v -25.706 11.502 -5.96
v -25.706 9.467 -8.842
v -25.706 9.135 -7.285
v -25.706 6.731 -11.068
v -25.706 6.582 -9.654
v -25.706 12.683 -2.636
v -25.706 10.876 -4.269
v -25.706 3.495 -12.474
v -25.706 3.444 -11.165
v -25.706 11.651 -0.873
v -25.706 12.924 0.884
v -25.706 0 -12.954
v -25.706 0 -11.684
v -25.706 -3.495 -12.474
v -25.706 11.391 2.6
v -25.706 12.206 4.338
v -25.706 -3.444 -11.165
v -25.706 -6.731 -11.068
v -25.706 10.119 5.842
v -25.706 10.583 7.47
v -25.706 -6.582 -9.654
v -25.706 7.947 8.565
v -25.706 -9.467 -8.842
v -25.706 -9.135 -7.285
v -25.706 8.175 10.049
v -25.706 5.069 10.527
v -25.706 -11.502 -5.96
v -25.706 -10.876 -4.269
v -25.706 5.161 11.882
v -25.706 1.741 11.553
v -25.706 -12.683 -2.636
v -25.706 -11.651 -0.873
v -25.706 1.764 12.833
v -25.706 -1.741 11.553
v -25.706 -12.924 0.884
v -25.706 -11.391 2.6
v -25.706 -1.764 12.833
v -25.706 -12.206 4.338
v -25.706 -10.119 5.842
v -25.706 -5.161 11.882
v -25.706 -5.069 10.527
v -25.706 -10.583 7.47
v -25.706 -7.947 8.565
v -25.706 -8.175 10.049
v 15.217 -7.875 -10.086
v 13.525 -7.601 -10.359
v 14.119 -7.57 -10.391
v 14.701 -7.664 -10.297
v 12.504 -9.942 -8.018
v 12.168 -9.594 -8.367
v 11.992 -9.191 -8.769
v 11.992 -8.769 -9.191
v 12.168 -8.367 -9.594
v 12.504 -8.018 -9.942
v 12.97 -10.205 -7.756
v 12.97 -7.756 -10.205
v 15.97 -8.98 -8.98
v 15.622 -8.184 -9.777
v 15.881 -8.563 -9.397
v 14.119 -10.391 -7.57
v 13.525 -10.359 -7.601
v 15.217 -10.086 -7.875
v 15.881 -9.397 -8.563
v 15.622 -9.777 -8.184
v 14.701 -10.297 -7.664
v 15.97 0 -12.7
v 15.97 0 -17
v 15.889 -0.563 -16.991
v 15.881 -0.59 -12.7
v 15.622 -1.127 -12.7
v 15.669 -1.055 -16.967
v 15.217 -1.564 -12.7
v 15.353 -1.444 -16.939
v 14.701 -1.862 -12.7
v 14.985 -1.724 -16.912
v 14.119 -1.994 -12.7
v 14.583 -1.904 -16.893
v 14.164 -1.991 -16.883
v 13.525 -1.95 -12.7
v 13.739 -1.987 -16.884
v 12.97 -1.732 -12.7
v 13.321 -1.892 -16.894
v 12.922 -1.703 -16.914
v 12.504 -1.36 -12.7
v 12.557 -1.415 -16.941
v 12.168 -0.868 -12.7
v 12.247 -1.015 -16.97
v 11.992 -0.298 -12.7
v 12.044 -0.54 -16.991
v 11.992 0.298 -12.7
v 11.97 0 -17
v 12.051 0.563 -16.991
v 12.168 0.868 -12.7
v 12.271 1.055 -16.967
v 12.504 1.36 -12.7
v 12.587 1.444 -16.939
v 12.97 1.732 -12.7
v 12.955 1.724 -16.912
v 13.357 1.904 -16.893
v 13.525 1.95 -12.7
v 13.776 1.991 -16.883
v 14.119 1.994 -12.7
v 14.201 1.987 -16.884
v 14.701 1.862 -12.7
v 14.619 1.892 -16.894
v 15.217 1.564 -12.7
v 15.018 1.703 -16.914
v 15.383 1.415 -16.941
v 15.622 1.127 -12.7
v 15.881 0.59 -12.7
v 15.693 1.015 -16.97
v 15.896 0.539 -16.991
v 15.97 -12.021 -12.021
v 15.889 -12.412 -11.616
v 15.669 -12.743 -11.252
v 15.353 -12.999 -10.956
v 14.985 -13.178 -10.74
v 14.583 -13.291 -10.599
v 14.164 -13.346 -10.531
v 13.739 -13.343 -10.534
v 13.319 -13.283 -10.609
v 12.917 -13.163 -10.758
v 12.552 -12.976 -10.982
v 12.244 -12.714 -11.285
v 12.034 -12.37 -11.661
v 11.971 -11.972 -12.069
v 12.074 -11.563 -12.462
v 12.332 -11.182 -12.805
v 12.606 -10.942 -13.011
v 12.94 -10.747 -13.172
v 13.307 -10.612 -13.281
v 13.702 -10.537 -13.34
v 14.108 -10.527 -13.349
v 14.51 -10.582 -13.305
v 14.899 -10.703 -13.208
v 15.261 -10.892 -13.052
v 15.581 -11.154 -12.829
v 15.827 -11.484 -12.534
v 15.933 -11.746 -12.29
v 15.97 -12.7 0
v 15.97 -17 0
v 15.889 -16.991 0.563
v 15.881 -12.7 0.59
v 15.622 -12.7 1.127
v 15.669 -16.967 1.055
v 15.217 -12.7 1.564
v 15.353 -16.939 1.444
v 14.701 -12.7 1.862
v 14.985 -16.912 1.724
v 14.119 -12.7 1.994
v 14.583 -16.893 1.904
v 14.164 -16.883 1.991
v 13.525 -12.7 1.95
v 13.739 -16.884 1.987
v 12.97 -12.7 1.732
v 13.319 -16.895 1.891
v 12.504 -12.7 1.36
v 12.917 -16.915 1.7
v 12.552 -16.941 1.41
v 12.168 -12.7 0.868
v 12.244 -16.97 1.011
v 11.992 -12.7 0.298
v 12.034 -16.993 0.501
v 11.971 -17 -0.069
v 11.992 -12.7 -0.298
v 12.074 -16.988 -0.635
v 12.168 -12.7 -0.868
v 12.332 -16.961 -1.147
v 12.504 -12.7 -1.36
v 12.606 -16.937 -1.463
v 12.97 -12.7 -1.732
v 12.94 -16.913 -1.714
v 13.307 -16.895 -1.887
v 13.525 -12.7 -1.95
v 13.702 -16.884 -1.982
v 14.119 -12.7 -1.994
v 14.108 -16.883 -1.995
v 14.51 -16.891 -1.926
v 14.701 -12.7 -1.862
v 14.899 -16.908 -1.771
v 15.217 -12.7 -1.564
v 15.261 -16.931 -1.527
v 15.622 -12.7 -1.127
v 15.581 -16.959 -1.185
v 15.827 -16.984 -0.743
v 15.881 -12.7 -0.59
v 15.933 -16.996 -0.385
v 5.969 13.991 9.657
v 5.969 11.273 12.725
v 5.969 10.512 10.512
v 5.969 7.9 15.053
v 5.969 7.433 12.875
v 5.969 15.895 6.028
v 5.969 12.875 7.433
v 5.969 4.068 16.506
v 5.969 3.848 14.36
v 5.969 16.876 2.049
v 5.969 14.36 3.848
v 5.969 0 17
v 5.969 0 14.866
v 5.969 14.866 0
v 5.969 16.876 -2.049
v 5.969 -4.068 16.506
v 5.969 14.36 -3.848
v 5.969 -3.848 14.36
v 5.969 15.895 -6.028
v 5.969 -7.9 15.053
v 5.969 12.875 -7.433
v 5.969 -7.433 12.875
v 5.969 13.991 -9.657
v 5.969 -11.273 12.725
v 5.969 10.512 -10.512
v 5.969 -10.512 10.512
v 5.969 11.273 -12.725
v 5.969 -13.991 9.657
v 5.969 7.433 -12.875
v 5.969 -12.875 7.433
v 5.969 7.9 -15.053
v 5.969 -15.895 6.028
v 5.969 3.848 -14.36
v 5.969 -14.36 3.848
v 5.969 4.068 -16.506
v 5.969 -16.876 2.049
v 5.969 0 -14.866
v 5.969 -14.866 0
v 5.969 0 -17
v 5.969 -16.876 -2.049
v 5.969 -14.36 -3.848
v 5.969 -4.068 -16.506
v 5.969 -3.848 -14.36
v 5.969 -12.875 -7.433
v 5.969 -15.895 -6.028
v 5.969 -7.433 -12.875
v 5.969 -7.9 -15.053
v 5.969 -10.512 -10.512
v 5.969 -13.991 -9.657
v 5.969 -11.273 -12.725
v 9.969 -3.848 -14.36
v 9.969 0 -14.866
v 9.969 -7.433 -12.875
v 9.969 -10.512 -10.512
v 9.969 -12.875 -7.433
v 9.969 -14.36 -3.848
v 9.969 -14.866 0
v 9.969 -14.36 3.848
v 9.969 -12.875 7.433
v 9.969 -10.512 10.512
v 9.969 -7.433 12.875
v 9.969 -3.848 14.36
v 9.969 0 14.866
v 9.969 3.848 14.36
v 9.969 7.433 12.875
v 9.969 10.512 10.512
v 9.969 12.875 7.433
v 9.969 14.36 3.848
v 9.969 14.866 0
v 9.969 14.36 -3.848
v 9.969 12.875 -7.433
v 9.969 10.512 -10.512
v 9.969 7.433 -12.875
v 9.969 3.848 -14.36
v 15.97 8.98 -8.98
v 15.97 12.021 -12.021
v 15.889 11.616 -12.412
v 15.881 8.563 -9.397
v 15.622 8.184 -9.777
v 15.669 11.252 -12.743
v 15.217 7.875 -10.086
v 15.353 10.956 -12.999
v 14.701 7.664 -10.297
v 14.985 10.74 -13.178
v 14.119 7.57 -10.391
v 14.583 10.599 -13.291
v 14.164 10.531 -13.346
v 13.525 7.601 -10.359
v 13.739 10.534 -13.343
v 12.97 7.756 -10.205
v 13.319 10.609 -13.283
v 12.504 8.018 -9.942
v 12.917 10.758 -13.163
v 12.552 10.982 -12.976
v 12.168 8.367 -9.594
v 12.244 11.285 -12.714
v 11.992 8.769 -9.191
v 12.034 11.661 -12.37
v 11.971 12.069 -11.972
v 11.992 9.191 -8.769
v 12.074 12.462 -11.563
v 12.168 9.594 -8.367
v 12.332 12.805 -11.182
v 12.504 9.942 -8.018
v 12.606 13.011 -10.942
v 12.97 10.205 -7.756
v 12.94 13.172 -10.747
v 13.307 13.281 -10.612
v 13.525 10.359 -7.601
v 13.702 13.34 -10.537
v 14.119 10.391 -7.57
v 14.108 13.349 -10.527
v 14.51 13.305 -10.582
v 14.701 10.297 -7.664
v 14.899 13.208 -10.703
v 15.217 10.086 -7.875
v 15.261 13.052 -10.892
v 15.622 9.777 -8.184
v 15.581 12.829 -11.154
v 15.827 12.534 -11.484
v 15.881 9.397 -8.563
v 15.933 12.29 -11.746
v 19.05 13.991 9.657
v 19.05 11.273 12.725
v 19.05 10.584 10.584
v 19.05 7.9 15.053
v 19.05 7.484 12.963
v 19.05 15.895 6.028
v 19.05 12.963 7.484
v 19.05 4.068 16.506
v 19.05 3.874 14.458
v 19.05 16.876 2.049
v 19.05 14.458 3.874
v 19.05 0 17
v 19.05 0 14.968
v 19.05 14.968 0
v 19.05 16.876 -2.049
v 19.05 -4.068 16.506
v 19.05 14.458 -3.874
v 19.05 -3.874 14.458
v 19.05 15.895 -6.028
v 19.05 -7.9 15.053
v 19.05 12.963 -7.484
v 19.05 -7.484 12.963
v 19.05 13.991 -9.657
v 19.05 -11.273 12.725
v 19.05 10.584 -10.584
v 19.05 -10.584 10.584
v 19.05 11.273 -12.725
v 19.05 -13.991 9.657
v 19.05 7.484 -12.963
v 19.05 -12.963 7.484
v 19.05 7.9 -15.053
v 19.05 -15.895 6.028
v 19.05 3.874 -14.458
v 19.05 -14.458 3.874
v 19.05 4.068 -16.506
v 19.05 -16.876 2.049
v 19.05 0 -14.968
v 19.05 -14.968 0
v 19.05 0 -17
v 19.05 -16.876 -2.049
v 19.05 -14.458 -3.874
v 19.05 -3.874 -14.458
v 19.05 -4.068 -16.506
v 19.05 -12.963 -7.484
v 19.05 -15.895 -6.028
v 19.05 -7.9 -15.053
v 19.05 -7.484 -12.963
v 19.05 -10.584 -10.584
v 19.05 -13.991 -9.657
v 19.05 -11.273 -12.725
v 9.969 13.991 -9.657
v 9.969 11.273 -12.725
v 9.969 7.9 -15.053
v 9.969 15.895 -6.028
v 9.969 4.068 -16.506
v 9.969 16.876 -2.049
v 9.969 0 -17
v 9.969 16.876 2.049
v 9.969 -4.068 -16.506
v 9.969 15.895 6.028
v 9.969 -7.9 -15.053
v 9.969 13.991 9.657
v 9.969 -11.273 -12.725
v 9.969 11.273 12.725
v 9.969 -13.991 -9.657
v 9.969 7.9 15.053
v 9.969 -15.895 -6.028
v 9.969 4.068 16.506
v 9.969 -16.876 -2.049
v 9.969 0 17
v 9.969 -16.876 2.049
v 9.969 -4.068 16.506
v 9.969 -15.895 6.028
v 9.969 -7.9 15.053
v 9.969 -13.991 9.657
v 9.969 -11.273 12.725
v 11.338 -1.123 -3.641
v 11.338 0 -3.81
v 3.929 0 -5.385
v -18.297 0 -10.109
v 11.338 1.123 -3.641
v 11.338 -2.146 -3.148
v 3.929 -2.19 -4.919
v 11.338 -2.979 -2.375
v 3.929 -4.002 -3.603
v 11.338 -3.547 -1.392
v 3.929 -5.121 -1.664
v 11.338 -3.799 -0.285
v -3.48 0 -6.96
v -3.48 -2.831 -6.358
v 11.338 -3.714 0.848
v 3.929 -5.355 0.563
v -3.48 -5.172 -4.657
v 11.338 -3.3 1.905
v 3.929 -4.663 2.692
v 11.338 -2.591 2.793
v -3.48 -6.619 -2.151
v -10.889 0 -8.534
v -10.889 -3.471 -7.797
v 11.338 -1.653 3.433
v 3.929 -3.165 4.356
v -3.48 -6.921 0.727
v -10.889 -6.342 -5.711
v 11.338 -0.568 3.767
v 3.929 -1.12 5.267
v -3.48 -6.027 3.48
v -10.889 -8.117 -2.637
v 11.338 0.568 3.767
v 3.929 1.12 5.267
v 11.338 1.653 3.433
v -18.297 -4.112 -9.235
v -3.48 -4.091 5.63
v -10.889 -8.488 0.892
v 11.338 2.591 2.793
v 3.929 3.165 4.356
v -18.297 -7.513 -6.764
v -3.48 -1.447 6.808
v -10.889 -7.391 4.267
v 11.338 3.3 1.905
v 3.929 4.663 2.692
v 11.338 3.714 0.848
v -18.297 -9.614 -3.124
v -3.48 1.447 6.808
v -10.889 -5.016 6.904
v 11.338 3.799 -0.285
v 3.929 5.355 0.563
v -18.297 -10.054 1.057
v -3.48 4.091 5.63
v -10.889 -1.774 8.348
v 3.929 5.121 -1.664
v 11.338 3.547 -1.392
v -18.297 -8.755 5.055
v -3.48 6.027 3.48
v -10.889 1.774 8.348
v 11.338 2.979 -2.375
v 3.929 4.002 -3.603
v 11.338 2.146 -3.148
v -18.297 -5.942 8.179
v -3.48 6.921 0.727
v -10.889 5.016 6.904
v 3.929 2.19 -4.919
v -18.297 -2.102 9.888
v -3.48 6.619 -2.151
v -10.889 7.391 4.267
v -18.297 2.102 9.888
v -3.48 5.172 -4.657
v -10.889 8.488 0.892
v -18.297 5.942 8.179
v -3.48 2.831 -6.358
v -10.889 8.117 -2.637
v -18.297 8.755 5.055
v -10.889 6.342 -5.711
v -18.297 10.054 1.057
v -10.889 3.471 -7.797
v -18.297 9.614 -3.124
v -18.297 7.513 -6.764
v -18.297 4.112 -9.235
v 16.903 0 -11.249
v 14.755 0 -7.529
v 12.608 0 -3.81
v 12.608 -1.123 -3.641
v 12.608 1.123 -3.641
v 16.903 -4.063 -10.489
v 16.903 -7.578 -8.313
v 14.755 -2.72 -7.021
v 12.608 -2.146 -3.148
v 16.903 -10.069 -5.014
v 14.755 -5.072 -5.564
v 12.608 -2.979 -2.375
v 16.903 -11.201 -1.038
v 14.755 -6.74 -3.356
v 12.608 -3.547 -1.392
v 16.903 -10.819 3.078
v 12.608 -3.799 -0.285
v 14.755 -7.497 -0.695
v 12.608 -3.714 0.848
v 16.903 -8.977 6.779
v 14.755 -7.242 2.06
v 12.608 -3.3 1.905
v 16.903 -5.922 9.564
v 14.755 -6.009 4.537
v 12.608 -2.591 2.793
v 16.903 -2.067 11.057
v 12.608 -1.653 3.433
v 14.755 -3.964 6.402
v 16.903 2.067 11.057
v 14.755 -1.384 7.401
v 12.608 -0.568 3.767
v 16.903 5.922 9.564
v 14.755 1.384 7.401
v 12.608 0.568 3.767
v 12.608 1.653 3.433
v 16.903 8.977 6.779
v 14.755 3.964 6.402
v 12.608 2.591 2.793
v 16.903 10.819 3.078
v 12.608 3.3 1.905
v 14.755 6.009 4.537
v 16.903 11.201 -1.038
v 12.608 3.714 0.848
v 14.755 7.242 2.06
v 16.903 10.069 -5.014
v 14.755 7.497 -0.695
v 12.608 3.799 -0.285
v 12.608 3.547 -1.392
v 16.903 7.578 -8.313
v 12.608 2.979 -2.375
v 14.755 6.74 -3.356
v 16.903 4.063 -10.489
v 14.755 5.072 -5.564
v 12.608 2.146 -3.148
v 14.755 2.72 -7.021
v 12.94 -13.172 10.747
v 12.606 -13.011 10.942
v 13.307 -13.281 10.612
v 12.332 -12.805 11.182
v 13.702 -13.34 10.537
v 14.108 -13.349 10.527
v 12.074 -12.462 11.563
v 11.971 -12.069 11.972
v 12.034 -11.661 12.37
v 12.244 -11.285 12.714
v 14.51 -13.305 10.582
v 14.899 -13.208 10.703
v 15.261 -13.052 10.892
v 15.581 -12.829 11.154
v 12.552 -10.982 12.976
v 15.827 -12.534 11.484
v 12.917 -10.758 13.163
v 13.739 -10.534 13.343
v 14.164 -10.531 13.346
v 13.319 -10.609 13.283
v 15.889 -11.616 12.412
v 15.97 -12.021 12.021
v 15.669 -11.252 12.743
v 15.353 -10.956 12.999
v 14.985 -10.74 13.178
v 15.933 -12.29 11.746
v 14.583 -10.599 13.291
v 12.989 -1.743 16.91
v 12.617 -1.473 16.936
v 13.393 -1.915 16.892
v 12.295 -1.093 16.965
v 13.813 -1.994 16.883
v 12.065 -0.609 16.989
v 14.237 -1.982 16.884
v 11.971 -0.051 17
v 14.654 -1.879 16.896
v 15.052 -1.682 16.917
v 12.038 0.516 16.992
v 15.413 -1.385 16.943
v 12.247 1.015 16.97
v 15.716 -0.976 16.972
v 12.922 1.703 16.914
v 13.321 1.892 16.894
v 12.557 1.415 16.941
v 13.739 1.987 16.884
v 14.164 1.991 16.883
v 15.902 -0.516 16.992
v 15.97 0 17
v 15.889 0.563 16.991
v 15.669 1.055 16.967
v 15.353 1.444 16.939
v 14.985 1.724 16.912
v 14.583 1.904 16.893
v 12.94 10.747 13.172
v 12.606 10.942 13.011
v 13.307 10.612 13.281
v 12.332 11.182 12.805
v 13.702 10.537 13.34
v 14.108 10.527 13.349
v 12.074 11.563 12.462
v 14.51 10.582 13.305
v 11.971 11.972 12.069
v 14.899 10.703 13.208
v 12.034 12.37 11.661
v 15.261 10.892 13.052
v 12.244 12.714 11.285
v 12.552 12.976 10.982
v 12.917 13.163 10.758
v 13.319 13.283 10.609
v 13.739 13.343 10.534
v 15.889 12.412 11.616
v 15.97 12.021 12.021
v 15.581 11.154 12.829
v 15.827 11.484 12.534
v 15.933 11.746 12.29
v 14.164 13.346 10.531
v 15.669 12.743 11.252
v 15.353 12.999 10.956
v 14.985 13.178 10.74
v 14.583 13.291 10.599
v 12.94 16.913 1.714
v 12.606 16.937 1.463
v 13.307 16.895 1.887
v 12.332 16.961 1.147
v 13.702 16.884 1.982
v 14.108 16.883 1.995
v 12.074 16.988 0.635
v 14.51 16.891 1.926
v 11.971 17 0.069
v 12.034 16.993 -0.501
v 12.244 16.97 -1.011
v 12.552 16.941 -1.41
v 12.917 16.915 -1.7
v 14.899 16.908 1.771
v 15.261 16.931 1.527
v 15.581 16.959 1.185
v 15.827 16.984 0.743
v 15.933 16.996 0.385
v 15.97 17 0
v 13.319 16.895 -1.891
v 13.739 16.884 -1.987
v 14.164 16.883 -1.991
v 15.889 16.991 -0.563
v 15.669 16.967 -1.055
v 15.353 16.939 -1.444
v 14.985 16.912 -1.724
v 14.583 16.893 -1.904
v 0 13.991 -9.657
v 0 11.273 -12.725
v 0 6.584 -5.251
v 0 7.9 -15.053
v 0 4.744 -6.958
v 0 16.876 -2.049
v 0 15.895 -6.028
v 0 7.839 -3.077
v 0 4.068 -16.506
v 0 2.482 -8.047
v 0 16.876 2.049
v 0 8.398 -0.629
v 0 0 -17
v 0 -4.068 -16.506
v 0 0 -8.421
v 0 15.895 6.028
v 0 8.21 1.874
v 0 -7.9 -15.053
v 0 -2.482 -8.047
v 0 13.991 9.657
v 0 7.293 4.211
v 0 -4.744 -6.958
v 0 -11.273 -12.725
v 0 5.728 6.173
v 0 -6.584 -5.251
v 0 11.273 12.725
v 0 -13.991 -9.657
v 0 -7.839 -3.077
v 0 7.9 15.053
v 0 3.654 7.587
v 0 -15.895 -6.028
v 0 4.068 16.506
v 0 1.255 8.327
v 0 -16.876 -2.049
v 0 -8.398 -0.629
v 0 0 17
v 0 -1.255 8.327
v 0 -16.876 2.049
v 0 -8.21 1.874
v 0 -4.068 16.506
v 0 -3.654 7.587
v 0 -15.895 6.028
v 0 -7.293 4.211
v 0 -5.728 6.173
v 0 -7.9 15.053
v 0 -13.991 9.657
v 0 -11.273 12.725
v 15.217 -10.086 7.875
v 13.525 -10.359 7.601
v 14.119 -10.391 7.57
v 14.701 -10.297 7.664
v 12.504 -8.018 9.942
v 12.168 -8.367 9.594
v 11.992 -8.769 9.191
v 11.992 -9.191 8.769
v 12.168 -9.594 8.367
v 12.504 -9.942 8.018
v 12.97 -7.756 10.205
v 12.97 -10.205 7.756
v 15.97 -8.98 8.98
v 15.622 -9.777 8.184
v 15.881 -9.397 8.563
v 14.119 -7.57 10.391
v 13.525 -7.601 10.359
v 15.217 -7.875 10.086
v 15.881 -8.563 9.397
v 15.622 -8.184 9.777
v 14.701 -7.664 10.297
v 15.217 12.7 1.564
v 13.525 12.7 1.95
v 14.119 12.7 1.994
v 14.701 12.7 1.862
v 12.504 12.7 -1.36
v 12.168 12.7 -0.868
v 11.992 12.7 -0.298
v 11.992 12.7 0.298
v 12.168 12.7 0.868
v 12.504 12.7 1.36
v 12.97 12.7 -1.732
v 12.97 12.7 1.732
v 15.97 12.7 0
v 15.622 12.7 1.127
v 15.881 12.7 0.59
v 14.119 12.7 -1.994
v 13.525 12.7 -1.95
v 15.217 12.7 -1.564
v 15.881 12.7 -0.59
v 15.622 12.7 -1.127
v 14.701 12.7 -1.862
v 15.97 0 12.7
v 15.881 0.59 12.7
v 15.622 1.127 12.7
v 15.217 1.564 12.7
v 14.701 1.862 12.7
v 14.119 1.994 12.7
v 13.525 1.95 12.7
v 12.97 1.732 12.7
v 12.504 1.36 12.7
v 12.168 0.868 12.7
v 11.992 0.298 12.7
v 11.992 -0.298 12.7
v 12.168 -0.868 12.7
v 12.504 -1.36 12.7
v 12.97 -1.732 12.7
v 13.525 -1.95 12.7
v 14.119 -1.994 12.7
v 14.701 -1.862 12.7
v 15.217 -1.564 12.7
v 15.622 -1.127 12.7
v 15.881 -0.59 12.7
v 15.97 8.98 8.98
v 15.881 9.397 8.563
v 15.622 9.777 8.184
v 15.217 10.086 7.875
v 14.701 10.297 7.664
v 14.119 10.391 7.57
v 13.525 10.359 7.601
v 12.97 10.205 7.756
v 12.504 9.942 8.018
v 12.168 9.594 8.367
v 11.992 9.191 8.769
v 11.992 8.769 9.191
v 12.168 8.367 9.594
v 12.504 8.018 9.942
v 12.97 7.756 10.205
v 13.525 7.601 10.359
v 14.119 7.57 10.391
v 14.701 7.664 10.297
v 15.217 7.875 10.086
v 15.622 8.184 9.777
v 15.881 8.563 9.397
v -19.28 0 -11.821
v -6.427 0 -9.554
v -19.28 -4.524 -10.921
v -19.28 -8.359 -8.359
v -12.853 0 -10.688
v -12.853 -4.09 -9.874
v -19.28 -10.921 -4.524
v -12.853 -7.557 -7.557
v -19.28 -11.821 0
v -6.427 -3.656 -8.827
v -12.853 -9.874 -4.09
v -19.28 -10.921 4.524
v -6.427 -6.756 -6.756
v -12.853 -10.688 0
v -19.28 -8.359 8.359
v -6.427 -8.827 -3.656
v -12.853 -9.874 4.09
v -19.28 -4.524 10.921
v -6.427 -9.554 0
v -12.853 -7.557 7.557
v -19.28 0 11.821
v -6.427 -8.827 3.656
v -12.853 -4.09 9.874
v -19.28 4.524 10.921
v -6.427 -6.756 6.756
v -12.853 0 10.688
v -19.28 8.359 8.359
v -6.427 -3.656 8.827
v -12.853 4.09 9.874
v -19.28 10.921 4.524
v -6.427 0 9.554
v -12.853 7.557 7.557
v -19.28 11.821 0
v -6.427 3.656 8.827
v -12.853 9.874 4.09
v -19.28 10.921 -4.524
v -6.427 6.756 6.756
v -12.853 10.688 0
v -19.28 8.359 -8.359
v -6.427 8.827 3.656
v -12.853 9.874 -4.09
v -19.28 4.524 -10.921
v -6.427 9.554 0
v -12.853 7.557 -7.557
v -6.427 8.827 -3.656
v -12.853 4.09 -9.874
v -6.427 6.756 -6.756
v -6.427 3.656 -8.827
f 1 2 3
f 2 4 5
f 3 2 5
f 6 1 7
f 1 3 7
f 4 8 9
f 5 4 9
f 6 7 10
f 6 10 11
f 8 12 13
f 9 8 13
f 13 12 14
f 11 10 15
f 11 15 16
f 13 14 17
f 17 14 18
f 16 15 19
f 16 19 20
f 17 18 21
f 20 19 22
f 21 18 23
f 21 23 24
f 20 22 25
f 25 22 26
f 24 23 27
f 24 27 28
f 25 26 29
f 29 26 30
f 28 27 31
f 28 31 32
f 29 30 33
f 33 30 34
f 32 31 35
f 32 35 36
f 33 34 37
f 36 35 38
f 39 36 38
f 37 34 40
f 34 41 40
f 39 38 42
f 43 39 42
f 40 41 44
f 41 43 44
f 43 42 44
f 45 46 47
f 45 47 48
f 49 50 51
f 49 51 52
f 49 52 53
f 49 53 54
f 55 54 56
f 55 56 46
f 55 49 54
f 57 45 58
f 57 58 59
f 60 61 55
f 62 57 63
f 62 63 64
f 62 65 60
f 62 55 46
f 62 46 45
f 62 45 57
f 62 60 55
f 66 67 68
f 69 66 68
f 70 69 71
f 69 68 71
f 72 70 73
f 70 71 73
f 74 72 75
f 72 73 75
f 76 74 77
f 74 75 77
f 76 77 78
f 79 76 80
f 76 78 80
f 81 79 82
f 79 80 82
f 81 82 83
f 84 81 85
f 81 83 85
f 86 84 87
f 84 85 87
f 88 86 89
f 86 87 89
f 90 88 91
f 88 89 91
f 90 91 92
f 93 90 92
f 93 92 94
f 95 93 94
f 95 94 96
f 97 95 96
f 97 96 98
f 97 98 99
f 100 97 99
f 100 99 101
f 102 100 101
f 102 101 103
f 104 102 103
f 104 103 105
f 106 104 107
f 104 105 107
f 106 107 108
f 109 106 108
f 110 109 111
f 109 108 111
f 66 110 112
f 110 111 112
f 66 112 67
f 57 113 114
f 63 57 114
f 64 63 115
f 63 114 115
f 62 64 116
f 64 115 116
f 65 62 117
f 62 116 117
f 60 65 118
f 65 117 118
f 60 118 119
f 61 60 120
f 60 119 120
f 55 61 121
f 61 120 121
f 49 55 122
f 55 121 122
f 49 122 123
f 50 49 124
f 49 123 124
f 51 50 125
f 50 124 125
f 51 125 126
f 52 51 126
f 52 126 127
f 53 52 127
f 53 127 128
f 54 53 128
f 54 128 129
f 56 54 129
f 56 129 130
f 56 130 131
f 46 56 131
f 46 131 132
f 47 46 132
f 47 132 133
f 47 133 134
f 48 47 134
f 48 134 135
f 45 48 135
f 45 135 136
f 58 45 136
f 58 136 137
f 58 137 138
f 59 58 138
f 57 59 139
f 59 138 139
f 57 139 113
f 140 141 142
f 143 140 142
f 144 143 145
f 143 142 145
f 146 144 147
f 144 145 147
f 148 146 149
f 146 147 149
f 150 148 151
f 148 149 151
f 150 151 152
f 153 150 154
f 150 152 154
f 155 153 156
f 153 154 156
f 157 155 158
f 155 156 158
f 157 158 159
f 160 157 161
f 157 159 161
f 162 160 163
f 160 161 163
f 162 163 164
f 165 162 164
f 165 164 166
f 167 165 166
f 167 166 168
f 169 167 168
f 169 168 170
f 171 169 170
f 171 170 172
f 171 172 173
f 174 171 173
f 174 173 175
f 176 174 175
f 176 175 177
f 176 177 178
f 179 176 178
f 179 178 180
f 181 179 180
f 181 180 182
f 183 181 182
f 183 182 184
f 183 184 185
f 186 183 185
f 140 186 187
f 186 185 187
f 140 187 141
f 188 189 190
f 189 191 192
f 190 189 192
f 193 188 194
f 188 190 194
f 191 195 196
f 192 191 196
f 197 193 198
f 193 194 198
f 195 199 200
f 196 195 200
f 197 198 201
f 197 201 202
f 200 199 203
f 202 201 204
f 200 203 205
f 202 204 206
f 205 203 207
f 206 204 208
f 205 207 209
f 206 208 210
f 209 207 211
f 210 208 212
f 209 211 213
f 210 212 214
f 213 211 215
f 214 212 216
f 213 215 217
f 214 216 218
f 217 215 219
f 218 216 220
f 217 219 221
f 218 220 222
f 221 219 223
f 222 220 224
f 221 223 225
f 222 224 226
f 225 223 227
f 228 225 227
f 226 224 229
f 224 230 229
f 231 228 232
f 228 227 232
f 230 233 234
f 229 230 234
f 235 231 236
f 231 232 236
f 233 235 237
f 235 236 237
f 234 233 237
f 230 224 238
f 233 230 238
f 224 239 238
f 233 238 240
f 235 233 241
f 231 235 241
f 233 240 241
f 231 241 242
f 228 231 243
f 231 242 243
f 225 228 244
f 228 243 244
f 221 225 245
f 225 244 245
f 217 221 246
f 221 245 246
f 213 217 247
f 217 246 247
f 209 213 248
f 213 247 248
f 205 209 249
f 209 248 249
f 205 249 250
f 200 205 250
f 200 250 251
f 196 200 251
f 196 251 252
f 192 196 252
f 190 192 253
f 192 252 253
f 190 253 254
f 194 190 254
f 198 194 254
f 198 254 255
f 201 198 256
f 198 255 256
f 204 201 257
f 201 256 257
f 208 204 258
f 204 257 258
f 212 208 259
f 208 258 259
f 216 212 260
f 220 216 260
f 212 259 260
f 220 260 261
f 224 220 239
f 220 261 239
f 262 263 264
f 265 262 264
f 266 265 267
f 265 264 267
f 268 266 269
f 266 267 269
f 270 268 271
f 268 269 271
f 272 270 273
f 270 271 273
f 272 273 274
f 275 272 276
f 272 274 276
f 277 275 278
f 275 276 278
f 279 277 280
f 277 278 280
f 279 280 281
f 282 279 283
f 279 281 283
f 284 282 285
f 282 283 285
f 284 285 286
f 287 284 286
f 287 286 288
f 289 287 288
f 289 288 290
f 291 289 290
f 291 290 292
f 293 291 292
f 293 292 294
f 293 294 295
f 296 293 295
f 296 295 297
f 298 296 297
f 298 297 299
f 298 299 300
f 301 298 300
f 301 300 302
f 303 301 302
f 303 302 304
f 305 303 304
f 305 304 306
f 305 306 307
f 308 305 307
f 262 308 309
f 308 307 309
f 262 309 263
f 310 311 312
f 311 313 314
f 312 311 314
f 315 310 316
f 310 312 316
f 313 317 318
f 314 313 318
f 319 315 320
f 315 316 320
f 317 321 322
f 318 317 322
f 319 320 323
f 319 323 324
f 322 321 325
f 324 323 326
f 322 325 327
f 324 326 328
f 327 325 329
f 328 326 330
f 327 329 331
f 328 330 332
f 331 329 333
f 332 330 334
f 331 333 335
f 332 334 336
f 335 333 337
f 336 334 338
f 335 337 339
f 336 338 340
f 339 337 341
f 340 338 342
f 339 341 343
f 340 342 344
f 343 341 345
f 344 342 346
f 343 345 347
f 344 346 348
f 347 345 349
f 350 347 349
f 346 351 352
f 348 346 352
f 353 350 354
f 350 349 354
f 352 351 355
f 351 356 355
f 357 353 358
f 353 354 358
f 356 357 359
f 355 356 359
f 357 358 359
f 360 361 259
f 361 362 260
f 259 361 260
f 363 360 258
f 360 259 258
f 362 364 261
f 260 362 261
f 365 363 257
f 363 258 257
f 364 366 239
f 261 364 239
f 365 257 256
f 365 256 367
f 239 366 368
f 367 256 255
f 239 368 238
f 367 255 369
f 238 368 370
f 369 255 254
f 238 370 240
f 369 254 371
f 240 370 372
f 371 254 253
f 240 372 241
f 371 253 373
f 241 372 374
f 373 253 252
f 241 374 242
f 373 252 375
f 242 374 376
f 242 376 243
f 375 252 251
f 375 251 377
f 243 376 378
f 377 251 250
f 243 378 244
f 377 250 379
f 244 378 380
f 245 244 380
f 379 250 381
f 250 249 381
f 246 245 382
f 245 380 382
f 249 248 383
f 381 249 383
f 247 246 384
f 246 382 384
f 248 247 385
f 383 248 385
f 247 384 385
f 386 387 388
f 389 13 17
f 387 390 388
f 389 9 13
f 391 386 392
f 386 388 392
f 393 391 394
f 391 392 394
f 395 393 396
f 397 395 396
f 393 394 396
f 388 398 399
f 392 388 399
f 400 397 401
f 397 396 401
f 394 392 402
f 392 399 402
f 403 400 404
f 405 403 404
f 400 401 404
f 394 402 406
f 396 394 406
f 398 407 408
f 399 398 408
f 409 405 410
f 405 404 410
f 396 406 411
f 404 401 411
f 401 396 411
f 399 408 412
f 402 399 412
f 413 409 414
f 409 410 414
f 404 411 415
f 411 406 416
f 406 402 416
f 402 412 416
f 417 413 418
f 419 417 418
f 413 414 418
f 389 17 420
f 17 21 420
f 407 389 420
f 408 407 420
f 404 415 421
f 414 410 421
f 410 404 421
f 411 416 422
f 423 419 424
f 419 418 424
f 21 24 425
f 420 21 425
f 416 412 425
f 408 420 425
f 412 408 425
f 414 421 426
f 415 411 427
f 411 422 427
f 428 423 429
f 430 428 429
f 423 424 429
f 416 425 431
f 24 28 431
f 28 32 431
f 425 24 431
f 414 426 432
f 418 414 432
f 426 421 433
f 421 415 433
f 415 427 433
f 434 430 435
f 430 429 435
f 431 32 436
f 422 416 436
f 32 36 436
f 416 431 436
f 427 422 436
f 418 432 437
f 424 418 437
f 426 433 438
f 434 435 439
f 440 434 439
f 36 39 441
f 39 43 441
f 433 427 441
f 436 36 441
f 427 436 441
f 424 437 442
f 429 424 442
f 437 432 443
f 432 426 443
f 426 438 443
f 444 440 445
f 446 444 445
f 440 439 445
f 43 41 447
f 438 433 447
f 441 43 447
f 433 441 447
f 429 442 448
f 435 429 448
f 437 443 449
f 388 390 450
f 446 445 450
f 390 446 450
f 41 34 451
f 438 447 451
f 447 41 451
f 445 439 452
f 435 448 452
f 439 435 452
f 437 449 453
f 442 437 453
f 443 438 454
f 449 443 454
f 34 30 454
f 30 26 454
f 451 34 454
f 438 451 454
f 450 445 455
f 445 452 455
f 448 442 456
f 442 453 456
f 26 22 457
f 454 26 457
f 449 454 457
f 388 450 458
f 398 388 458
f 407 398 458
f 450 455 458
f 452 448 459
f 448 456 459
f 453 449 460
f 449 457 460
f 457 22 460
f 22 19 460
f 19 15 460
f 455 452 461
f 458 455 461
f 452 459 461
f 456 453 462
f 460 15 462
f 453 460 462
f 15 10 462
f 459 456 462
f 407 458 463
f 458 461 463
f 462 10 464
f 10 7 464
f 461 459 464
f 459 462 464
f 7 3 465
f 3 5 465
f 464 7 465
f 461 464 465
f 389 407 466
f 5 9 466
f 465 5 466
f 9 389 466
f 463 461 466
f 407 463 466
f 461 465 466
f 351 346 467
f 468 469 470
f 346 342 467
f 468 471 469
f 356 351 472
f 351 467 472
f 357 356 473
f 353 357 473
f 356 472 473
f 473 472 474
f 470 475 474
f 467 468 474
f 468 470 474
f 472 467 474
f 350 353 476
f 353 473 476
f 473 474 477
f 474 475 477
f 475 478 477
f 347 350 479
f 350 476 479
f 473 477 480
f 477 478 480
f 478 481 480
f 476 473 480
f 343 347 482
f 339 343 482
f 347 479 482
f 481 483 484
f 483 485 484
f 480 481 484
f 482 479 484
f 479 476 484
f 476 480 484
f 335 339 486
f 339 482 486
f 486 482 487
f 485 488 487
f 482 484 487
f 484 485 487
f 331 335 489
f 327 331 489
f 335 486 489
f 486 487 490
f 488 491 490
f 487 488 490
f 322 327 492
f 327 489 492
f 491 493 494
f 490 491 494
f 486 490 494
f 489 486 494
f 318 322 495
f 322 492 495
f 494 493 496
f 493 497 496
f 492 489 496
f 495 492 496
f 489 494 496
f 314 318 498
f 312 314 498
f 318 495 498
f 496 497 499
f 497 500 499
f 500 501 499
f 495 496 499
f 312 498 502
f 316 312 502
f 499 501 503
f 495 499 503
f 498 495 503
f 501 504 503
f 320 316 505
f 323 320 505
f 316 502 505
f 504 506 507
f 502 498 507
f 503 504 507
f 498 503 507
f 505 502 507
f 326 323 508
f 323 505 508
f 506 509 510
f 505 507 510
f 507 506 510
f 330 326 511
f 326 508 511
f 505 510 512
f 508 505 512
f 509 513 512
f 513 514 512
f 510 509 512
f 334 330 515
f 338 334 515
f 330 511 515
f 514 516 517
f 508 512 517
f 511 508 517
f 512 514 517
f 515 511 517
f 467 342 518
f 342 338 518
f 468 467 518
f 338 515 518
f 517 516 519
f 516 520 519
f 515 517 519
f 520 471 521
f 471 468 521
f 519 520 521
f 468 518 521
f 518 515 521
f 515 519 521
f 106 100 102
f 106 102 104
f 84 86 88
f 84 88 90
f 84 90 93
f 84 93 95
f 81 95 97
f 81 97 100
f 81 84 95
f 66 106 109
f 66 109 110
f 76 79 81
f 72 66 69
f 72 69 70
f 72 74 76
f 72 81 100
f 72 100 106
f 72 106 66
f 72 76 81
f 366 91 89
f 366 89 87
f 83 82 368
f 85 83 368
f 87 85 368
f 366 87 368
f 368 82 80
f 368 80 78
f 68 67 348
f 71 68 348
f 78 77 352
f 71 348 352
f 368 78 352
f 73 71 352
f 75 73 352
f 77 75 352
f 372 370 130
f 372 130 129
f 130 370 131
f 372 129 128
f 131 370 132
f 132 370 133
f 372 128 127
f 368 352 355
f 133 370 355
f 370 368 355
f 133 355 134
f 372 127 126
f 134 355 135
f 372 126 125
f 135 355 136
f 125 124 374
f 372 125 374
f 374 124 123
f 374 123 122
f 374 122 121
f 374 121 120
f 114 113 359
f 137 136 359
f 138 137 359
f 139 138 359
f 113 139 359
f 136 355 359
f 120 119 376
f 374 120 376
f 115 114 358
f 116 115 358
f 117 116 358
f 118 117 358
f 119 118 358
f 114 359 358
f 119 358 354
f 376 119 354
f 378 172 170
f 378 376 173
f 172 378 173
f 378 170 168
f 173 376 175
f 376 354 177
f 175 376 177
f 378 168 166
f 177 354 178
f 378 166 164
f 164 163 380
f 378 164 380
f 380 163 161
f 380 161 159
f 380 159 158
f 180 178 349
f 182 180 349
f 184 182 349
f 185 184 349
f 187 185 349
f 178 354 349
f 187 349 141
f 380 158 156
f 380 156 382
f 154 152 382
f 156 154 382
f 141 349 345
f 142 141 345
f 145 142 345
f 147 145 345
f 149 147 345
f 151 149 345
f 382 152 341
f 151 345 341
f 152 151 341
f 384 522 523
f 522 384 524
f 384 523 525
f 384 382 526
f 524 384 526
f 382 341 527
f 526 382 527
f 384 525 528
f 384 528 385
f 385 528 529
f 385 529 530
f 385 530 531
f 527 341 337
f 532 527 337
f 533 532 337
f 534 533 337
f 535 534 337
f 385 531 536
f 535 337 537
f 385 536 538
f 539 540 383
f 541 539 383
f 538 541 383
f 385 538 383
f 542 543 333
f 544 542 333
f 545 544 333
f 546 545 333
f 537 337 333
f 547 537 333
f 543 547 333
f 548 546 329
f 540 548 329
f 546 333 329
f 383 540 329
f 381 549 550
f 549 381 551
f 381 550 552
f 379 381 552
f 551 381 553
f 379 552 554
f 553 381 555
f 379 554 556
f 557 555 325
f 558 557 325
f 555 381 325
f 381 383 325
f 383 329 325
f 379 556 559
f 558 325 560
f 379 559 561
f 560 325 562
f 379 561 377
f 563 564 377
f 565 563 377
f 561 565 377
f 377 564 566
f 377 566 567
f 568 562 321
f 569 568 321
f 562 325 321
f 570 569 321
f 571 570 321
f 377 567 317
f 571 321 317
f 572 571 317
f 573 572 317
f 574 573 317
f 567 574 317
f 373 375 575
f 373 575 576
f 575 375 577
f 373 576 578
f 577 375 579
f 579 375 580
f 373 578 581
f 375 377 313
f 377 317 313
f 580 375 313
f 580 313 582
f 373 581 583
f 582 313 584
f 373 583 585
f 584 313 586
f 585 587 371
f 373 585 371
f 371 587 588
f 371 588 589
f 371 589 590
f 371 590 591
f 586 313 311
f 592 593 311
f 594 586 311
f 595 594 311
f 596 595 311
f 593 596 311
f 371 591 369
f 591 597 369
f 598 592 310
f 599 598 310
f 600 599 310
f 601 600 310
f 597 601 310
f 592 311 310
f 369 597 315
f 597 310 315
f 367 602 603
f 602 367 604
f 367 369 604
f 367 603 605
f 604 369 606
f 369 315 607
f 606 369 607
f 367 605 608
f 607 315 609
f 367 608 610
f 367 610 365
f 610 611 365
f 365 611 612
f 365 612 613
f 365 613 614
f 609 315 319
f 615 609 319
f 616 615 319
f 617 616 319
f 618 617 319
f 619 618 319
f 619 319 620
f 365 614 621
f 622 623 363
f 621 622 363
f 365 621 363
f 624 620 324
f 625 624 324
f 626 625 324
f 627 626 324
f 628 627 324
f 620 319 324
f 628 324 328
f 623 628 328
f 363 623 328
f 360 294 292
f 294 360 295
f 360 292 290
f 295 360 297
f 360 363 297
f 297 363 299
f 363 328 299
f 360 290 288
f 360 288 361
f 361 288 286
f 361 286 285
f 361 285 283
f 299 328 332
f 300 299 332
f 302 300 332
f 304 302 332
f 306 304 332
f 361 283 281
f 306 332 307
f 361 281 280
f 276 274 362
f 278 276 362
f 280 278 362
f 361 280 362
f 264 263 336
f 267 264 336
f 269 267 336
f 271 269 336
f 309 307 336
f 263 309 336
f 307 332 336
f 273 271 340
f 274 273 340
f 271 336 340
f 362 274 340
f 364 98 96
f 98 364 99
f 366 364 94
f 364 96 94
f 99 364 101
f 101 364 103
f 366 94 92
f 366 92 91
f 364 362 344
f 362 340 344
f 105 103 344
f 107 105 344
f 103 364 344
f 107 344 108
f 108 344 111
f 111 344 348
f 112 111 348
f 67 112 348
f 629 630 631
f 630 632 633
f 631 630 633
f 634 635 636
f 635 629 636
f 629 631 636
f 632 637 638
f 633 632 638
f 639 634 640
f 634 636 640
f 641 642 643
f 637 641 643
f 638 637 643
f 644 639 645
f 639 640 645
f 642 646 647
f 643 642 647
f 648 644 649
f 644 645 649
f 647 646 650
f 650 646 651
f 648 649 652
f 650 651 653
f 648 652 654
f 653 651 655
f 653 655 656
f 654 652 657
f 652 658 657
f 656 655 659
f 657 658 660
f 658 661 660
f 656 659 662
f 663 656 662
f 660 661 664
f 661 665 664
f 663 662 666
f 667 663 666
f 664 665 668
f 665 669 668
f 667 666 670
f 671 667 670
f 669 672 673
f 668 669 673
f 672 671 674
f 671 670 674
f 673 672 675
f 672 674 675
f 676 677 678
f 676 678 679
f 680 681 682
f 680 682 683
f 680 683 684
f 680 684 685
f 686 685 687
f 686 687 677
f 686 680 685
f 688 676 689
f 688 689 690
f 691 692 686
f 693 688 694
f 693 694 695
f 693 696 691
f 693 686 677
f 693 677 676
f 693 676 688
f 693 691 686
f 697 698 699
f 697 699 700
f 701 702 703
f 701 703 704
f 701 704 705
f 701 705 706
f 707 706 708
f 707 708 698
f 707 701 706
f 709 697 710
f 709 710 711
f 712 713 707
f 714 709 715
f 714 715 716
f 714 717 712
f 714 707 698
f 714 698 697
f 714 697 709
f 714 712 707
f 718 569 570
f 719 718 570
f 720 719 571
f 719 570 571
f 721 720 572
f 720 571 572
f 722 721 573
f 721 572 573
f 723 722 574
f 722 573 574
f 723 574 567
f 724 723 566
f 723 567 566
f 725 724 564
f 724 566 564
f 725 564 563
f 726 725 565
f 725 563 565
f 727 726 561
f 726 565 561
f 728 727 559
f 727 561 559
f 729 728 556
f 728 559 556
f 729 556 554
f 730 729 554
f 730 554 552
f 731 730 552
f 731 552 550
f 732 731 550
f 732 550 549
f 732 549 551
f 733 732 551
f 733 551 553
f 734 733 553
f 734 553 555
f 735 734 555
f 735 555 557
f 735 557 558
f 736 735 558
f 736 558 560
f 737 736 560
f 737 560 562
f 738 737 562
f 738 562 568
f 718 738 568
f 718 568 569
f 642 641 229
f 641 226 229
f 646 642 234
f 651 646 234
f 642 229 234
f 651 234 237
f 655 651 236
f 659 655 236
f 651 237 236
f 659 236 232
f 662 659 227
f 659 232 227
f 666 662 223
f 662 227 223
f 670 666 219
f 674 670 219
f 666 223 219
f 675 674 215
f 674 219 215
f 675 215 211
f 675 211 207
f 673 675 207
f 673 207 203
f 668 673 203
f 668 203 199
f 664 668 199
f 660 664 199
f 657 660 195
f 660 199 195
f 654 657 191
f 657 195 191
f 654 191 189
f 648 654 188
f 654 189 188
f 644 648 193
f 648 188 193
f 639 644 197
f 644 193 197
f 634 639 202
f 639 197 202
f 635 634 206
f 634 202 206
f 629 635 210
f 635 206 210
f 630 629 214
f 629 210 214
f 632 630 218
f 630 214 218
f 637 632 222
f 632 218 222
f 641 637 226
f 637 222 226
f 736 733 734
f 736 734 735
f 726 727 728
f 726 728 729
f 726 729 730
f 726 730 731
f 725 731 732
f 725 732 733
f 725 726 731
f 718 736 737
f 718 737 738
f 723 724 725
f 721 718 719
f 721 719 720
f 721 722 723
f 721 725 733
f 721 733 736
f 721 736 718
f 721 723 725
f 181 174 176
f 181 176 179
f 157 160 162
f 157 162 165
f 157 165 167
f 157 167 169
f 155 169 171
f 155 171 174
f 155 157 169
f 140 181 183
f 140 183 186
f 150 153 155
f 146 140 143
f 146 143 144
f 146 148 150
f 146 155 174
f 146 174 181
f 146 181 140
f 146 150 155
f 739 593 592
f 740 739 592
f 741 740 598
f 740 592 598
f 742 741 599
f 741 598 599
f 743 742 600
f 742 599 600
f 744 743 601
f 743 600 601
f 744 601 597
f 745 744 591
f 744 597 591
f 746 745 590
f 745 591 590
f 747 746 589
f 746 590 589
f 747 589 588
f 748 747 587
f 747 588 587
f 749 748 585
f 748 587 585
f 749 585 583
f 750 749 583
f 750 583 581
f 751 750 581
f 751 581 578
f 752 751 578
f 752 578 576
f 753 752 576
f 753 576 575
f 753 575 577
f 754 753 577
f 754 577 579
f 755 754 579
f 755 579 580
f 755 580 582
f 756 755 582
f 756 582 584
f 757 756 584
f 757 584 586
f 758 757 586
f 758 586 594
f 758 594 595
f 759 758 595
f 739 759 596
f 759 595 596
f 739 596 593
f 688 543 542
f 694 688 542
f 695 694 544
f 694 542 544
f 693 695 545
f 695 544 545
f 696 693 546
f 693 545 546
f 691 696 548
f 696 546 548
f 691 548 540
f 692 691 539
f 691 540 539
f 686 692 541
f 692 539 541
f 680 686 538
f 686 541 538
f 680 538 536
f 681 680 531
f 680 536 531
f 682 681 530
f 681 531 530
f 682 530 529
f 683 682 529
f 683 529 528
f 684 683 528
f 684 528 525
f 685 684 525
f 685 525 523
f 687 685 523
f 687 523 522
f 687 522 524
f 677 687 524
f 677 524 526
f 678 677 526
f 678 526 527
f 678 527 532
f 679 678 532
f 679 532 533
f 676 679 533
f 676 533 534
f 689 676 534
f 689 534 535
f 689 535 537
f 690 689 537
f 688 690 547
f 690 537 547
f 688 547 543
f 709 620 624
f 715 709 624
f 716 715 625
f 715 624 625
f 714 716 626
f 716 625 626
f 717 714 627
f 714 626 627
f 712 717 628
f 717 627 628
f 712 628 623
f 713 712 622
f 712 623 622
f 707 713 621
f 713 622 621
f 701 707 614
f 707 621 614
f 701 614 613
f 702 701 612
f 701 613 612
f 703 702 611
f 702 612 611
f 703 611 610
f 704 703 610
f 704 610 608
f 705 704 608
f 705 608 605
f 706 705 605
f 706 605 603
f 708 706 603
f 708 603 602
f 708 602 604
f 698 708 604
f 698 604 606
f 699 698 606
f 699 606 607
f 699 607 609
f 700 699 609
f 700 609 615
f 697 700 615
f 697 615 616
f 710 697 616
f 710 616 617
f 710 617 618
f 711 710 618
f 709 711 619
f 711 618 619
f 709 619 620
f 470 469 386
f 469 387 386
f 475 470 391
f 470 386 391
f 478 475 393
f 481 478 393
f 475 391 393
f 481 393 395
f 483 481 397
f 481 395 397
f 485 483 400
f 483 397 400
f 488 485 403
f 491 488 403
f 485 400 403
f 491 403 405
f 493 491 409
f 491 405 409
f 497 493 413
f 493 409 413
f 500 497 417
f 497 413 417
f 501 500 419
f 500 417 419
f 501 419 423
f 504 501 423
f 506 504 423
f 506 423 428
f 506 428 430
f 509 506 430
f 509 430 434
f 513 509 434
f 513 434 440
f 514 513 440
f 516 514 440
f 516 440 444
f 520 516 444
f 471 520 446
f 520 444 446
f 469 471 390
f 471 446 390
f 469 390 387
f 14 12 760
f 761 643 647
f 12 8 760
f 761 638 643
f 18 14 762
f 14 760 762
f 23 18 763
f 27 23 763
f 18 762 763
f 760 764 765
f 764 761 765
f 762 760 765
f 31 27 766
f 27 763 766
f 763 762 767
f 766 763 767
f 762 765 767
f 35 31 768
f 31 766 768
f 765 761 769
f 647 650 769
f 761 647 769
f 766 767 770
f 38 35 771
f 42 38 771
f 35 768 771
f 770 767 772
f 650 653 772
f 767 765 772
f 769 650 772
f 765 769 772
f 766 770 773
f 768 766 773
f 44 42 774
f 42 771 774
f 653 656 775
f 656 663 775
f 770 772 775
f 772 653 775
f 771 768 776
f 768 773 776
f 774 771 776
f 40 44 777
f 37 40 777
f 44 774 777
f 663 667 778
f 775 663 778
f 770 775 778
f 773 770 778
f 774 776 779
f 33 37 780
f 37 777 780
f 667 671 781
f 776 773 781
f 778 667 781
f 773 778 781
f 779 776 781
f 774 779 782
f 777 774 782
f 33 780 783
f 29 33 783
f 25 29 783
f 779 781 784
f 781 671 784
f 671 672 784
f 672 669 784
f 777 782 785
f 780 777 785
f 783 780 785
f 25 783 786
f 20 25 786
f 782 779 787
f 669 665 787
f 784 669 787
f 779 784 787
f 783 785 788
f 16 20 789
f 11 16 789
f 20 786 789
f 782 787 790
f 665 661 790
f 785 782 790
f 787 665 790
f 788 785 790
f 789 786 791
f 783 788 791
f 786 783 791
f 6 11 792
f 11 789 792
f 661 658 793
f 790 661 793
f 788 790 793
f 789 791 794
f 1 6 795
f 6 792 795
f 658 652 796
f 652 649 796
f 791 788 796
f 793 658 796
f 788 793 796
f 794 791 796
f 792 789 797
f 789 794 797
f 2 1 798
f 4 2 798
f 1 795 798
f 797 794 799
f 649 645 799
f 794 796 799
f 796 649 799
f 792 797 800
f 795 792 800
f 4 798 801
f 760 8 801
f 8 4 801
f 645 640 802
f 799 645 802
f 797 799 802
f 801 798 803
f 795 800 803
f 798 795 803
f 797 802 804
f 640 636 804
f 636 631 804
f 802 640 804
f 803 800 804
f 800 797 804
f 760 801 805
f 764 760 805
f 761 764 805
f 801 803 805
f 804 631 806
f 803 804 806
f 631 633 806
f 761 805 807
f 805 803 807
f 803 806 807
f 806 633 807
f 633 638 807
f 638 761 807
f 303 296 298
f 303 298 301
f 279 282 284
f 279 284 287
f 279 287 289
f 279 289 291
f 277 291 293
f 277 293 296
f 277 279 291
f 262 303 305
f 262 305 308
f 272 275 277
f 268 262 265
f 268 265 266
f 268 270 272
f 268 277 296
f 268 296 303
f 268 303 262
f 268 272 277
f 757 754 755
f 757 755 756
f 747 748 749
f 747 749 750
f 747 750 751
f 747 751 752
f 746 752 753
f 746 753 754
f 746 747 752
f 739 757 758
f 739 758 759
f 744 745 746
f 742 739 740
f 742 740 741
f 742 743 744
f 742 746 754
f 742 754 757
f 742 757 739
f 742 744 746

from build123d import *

# Parameters (mm, degrees)
SKETCH2_R          = 2
CUT_EXTRUDE1_DEPTH = 5.08
CIRPATTERN1_COUNT  = 8


with BuildPart() as part:
    # Sketch1 → Revolve1 (revolve)
    with BuildSketch(Plane.XY, mode=Mode.PRIVATE) as revolve1_sk:
        Polygon((0, 8.421280131), (0, 17), (5.969, 17), (5.969, 14.8664), (9.969, 14.8664), (9.969, 17), (19.05, 17), (19.05, 14.968), (12.607925696, 3.81), (11.337925696, 3.81), (-25.706331786, 11.684), (-25.706331786, 12.954), align=None)
    revolve(revolve1_sk.sketch.rotate(Axis((0, 0, 0), (-1, 0, 0)), 90), axis=Axis((0, 0, 0), (-1, 0, 0)))

    # Sketch2 → Cut-Extrude1 (cut)
    with BuildSketch(Plane.XY.offset(17.78)):
        with Locations((13.97, 0)):
            Circle(SKETCH2_R)
    cut_extrude1 = extrude(amount=-CUT_EXTRUDE1_DEPTH, mode=Mode.SUBTRACT)

    # CirPattern1: Cut-Extrude1 ×8 about axis
    cirpattern1_axis = Axis((0, 0, 0), (1, 0, 0))
    for i in range(1, CIRPATTERN1_COUNT):
        add(cut_extrude1.rotate(cirpattern1_axis, i * 360 / CIRPATTERN1_COUNT), mode=Mode.SUBTRACT)


solid = part.part
